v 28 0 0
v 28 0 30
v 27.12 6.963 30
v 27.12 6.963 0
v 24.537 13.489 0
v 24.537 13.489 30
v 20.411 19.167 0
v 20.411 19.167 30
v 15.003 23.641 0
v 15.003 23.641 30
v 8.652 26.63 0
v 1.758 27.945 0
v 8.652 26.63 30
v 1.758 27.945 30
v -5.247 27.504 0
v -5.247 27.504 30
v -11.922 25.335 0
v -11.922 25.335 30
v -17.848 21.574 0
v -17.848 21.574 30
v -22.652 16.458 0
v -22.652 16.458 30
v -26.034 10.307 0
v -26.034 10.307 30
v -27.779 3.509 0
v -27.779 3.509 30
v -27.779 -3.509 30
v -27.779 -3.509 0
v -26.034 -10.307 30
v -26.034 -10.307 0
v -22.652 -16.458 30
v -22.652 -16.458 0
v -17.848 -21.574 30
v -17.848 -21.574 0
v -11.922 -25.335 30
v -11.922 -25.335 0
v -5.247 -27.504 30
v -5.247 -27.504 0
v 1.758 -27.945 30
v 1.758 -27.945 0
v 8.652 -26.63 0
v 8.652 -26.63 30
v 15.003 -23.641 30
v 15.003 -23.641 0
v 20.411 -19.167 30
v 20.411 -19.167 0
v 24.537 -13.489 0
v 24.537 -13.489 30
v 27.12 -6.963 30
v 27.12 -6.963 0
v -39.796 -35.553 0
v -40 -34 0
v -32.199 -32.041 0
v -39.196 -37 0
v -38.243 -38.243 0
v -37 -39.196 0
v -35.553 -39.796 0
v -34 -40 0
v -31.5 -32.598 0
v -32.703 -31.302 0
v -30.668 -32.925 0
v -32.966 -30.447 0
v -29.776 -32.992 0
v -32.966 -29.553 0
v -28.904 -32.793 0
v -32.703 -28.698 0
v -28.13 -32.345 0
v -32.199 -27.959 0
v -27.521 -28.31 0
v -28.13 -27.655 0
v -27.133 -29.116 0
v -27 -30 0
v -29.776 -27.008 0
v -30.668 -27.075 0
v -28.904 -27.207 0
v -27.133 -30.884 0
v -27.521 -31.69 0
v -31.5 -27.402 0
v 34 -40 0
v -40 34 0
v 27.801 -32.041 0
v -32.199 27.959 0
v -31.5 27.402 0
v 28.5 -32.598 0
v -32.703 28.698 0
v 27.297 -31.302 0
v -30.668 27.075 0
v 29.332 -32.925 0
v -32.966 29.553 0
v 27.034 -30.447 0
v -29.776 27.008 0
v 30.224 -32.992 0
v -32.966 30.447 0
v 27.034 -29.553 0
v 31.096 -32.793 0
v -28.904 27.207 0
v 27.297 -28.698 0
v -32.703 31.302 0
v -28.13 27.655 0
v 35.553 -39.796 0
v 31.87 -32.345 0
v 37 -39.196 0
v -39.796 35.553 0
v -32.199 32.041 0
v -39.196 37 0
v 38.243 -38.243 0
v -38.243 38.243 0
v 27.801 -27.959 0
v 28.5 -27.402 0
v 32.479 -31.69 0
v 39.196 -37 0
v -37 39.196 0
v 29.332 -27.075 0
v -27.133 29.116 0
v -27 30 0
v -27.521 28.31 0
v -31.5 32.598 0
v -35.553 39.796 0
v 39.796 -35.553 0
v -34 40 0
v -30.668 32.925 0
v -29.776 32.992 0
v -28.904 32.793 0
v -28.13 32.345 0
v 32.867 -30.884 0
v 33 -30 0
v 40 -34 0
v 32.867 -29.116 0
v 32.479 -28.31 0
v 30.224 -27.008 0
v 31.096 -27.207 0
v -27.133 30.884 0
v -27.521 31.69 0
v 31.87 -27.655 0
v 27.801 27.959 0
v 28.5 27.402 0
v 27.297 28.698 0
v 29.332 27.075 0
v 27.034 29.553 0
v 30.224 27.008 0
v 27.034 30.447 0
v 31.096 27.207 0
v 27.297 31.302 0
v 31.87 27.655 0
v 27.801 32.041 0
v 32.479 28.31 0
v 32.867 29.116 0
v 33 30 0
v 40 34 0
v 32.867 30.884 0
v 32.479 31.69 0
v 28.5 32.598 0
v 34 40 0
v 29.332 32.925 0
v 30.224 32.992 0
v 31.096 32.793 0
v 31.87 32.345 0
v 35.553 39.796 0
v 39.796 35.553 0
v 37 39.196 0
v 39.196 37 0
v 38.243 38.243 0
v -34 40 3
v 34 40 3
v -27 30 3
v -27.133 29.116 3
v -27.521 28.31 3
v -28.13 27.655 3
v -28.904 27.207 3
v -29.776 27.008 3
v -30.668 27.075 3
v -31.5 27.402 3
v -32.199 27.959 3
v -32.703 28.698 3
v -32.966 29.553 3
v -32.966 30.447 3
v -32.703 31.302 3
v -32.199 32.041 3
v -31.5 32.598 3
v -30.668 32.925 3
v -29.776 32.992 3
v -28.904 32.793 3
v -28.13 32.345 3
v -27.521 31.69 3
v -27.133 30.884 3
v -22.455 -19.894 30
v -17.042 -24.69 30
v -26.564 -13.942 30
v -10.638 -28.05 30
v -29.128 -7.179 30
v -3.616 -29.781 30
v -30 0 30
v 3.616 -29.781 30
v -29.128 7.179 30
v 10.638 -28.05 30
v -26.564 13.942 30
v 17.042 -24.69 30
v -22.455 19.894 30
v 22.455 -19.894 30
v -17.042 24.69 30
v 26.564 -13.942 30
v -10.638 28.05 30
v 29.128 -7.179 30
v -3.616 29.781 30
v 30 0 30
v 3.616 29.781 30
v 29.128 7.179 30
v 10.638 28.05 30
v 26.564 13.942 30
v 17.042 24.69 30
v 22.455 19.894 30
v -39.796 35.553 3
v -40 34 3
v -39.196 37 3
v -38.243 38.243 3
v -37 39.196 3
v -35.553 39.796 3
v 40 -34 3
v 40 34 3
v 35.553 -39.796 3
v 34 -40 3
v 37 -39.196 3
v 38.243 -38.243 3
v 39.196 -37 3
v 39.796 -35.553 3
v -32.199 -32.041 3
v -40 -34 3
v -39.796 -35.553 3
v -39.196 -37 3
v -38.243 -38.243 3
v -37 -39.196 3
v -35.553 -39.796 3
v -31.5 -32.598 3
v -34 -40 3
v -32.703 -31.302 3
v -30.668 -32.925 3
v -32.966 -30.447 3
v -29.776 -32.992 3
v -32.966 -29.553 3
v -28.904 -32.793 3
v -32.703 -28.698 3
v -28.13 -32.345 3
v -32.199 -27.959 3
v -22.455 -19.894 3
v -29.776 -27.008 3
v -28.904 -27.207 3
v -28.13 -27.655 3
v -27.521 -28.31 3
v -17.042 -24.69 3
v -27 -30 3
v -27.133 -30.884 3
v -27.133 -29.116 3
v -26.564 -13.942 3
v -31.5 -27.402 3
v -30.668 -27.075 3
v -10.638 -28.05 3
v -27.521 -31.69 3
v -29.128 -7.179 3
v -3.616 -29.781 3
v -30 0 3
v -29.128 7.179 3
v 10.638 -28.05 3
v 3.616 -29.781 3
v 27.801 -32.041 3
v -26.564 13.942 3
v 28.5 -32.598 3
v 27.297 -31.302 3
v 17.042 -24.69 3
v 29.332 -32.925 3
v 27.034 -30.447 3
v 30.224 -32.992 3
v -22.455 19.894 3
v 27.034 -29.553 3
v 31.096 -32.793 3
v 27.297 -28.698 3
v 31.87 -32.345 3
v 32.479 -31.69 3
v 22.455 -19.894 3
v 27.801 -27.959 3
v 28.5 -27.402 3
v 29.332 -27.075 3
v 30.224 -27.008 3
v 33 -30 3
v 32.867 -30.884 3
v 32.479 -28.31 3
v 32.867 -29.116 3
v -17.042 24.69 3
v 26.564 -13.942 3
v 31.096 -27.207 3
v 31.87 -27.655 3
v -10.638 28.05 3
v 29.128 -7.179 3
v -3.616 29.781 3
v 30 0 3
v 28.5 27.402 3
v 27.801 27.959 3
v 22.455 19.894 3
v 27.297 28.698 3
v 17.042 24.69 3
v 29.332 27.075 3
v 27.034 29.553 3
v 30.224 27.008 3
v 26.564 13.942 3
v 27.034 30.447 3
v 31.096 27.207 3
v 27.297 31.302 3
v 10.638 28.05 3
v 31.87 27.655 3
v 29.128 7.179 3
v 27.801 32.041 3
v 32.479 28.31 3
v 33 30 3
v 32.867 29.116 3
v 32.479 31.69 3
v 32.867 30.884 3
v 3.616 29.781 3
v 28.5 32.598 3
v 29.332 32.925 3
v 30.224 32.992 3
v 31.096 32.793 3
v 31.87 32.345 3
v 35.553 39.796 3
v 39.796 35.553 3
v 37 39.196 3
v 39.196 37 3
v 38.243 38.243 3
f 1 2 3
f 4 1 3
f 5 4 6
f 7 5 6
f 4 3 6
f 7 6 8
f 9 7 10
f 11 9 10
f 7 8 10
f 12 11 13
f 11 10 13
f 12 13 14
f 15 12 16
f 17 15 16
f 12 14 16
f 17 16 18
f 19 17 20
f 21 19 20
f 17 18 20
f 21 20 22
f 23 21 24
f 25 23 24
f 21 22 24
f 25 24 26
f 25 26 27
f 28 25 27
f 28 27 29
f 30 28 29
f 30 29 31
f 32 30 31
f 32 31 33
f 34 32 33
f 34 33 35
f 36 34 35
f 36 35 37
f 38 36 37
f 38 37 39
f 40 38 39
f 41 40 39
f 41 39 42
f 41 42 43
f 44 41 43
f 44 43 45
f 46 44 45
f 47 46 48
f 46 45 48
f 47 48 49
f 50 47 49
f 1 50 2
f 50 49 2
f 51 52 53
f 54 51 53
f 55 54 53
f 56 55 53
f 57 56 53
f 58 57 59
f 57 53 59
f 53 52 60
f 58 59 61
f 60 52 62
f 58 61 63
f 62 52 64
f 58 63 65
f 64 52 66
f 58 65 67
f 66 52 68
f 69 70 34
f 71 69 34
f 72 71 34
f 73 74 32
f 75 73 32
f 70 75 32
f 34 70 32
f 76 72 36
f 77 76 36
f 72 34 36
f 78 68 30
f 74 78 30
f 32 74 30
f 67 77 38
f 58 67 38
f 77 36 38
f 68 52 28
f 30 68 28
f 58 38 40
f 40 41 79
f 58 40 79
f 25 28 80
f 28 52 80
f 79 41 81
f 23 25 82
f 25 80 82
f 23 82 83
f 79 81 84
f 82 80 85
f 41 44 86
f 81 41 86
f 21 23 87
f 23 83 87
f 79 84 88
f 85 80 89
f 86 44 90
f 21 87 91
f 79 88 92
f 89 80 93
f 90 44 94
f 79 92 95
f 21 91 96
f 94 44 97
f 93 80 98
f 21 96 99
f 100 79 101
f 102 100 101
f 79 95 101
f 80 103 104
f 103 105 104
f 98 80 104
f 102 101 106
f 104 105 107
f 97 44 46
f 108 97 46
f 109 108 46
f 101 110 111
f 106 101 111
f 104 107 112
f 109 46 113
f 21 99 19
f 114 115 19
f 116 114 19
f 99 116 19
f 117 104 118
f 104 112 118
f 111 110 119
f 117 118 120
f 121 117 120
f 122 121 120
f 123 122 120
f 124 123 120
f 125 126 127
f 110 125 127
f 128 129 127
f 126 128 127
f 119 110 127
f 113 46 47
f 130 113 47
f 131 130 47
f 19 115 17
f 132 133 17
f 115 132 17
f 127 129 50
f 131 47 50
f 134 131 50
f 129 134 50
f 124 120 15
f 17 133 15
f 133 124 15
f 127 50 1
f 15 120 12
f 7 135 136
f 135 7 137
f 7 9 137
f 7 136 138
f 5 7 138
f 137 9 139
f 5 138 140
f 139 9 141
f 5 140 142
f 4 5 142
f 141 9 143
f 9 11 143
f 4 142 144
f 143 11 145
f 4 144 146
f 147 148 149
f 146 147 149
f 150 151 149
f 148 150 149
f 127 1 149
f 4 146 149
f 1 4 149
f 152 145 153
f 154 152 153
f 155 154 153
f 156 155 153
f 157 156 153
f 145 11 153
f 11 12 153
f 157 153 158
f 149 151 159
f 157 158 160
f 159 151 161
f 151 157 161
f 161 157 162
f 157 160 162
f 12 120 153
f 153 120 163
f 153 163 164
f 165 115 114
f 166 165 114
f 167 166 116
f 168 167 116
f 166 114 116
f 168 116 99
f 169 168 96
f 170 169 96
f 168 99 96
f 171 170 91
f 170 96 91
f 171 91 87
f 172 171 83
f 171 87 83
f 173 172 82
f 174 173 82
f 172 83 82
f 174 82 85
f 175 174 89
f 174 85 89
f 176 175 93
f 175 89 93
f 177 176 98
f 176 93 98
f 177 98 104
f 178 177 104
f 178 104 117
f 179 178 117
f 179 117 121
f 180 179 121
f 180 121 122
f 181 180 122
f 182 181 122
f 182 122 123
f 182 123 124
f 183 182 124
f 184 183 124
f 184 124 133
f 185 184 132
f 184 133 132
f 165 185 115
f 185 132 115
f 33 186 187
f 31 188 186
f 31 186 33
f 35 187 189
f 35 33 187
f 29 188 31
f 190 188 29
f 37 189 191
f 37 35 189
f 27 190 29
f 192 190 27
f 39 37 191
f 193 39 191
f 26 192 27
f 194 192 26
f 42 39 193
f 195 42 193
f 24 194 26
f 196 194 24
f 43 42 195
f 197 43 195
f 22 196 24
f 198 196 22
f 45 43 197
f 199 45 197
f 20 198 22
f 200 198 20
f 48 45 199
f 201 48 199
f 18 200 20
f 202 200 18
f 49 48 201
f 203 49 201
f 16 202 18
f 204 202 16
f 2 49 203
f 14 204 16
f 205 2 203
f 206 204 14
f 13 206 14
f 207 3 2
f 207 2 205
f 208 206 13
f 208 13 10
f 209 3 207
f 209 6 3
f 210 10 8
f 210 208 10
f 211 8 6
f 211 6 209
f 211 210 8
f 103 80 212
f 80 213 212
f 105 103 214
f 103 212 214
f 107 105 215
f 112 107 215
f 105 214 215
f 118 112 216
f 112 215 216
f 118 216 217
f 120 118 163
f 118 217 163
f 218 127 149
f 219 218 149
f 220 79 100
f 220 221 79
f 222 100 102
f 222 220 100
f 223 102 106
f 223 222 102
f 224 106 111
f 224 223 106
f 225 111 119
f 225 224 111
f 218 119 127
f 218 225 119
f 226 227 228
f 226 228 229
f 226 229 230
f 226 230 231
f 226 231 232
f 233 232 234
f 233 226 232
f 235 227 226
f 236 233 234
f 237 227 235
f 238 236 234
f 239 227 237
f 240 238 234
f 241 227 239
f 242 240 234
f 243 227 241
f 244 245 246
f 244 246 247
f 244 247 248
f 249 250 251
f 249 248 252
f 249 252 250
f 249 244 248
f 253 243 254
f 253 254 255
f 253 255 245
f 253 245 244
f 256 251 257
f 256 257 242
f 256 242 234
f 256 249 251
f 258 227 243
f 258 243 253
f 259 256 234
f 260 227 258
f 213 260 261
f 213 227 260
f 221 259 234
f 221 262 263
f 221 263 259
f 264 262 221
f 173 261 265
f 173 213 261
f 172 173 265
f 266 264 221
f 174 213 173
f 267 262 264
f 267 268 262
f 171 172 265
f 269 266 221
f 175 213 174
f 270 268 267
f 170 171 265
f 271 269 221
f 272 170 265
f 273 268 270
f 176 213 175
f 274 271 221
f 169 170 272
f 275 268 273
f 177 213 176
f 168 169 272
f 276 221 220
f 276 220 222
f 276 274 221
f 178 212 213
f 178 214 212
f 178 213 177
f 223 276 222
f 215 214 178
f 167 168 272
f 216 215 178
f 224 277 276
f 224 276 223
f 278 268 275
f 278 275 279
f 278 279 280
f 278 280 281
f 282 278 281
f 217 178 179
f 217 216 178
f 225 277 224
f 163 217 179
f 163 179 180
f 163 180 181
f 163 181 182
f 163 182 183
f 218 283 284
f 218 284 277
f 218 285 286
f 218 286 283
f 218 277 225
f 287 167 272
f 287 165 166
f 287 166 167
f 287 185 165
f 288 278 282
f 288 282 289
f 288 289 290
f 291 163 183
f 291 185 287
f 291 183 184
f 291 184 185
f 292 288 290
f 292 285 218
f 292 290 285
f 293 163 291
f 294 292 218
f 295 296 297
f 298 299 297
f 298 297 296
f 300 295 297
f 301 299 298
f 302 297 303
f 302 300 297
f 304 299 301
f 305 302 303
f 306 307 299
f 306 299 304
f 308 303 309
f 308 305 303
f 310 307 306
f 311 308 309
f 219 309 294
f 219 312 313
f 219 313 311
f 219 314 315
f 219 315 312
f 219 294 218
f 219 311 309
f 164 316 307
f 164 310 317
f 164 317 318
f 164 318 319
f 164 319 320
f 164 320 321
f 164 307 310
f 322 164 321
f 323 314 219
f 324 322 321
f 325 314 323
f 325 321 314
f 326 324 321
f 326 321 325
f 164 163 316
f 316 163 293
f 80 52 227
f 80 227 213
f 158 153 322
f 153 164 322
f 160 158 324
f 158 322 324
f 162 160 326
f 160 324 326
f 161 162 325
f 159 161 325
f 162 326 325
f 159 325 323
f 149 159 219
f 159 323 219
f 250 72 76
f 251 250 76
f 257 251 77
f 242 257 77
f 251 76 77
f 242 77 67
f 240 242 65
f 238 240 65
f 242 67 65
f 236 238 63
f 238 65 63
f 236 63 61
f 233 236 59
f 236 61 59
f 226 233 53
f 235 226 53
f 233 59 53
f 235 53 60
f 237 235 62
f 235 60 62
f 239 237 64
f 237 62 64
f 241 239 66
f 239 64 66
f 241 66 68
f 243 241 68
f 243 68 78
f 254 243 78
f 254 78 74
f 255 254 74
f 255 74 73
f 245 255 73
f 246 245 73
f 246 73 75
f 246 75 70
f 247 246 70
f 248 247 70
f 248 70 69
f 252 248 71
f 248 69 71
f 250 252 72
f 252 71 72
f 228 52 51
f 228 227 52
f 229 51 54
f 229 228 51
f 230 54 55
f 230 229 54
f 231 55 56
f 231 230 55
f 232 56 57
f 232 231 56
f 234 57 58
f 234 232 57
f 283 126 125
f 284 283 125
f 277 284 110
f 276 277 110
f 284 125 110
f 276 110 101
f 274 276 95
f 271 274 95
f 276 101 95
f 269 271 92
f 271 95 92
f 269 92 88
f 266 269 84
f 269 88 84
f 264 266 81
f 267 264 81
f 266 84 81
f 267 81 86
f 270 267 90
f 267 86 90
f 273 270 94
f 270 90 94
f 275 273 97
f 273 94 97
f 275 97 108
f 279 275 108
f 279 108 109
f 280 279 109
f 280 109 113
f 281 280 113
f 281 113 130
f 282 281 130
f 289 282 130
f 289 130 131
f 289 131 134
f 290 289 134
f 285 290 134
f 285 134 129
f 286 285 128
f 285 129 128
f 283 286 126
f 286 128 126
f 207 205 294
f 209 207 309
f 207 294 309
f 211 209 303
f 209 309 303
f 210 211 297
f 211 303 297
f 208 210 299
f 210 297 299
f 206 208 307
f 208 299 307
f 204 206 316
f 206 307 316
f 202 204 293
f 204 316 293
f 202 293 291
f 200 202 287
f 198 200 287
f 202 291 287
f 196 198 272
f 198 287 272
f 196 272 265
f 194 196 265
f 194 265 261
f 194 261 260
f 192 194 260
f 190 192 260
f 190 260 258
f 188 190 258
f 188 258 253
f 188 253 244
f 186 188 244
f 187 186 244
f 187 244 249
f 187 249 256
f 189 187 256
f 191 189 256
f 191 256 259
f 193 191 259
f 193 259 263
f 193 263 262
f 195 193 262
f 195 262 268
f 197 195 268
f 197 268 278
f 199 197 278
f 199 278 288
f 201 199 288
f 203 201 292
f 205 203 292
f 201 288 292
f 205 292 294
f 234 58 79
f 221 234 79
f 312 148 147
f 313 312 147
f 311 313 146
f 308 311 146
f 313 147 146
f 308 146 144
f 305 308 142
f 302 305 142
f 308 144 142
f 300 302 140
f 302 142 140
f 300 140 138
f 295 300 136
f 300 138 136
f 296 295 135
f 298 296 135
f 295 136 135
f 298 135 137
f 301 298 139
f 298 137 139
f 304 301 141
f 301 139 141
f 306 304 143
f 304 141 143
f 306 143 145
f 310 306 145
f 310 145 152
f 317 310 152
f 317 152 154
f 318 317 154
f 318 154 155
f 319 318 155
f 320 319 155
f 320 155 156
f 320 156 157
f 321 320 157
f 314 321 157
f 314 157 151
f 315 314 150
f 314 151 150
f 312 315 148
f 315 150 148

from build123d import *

# Parameters (mm, degrees)
SKETCH_R        = 30
PAD_DEPTH       = 30
SKETCH001_W     = 80
SKETCH001_H     = 80
PAD001_DEPTH    = 3
SKETCH002_R     = 28
POCKET_DEPTH    = 53
SKETCH003_R     = 3
POCKET001_DEPTH = 3
FILLET_R        = 6


with BuildPart() as part:
    # Sketch → Pad (new body)
    with BuildSketch(Plane.XY):
        Circle(SKETCH_R)
    extrude(amount=PAD_DEPTH)

    # Sketch001 → Pad001 (join)
    with BuildSketch(Plane.XY):
        Rectangle(SKETCH001_W, SKETCH001_H)
    extrude(amount=PAD001_DEPTH)

    # Sketch002 (on Face9 of Pad001) → Pocket (cut)
    with BuildSketch(Plane.XY.offset(30)):
        Circle(SKETCH002_R)
    extrude(amount=-POCKET_DEPTH, mode=Mode.SUBTRACT)

    # Sketch003 (on Face2 of Pocket) → Pocket001 (cut)
    with BuildSketch(Plane(origin=(0, 0, 0), x_dir=(1, 0, 0), z_dir=(0, 0, -1))):
        with Locations((-30, 30)):
            Circle(SKETCH003_R)
        with Locations((30, 30)):
            Circle(SKETCH003_R)
        with Locations((30, -30)):
            Circle(SKETCH003_R)
        with Locations((-30, -30)):
            Circle(SKETCH003_R)
    extrude(amount=-POCKET001_DEPTH, mode=Mode.SUBTRACT)

    # Fillet
    fillet_edges = [part.edges().sort_by_distance(p)[0] for p in [
        (-40, -40, 1.5),
        (40, -40, 1.5),
        (40, 40, 1.5),
        (-40, 40, 1.5),
    ]]
    fillet(fillet_edges, radius=FILLET_R)


solid = part.part
